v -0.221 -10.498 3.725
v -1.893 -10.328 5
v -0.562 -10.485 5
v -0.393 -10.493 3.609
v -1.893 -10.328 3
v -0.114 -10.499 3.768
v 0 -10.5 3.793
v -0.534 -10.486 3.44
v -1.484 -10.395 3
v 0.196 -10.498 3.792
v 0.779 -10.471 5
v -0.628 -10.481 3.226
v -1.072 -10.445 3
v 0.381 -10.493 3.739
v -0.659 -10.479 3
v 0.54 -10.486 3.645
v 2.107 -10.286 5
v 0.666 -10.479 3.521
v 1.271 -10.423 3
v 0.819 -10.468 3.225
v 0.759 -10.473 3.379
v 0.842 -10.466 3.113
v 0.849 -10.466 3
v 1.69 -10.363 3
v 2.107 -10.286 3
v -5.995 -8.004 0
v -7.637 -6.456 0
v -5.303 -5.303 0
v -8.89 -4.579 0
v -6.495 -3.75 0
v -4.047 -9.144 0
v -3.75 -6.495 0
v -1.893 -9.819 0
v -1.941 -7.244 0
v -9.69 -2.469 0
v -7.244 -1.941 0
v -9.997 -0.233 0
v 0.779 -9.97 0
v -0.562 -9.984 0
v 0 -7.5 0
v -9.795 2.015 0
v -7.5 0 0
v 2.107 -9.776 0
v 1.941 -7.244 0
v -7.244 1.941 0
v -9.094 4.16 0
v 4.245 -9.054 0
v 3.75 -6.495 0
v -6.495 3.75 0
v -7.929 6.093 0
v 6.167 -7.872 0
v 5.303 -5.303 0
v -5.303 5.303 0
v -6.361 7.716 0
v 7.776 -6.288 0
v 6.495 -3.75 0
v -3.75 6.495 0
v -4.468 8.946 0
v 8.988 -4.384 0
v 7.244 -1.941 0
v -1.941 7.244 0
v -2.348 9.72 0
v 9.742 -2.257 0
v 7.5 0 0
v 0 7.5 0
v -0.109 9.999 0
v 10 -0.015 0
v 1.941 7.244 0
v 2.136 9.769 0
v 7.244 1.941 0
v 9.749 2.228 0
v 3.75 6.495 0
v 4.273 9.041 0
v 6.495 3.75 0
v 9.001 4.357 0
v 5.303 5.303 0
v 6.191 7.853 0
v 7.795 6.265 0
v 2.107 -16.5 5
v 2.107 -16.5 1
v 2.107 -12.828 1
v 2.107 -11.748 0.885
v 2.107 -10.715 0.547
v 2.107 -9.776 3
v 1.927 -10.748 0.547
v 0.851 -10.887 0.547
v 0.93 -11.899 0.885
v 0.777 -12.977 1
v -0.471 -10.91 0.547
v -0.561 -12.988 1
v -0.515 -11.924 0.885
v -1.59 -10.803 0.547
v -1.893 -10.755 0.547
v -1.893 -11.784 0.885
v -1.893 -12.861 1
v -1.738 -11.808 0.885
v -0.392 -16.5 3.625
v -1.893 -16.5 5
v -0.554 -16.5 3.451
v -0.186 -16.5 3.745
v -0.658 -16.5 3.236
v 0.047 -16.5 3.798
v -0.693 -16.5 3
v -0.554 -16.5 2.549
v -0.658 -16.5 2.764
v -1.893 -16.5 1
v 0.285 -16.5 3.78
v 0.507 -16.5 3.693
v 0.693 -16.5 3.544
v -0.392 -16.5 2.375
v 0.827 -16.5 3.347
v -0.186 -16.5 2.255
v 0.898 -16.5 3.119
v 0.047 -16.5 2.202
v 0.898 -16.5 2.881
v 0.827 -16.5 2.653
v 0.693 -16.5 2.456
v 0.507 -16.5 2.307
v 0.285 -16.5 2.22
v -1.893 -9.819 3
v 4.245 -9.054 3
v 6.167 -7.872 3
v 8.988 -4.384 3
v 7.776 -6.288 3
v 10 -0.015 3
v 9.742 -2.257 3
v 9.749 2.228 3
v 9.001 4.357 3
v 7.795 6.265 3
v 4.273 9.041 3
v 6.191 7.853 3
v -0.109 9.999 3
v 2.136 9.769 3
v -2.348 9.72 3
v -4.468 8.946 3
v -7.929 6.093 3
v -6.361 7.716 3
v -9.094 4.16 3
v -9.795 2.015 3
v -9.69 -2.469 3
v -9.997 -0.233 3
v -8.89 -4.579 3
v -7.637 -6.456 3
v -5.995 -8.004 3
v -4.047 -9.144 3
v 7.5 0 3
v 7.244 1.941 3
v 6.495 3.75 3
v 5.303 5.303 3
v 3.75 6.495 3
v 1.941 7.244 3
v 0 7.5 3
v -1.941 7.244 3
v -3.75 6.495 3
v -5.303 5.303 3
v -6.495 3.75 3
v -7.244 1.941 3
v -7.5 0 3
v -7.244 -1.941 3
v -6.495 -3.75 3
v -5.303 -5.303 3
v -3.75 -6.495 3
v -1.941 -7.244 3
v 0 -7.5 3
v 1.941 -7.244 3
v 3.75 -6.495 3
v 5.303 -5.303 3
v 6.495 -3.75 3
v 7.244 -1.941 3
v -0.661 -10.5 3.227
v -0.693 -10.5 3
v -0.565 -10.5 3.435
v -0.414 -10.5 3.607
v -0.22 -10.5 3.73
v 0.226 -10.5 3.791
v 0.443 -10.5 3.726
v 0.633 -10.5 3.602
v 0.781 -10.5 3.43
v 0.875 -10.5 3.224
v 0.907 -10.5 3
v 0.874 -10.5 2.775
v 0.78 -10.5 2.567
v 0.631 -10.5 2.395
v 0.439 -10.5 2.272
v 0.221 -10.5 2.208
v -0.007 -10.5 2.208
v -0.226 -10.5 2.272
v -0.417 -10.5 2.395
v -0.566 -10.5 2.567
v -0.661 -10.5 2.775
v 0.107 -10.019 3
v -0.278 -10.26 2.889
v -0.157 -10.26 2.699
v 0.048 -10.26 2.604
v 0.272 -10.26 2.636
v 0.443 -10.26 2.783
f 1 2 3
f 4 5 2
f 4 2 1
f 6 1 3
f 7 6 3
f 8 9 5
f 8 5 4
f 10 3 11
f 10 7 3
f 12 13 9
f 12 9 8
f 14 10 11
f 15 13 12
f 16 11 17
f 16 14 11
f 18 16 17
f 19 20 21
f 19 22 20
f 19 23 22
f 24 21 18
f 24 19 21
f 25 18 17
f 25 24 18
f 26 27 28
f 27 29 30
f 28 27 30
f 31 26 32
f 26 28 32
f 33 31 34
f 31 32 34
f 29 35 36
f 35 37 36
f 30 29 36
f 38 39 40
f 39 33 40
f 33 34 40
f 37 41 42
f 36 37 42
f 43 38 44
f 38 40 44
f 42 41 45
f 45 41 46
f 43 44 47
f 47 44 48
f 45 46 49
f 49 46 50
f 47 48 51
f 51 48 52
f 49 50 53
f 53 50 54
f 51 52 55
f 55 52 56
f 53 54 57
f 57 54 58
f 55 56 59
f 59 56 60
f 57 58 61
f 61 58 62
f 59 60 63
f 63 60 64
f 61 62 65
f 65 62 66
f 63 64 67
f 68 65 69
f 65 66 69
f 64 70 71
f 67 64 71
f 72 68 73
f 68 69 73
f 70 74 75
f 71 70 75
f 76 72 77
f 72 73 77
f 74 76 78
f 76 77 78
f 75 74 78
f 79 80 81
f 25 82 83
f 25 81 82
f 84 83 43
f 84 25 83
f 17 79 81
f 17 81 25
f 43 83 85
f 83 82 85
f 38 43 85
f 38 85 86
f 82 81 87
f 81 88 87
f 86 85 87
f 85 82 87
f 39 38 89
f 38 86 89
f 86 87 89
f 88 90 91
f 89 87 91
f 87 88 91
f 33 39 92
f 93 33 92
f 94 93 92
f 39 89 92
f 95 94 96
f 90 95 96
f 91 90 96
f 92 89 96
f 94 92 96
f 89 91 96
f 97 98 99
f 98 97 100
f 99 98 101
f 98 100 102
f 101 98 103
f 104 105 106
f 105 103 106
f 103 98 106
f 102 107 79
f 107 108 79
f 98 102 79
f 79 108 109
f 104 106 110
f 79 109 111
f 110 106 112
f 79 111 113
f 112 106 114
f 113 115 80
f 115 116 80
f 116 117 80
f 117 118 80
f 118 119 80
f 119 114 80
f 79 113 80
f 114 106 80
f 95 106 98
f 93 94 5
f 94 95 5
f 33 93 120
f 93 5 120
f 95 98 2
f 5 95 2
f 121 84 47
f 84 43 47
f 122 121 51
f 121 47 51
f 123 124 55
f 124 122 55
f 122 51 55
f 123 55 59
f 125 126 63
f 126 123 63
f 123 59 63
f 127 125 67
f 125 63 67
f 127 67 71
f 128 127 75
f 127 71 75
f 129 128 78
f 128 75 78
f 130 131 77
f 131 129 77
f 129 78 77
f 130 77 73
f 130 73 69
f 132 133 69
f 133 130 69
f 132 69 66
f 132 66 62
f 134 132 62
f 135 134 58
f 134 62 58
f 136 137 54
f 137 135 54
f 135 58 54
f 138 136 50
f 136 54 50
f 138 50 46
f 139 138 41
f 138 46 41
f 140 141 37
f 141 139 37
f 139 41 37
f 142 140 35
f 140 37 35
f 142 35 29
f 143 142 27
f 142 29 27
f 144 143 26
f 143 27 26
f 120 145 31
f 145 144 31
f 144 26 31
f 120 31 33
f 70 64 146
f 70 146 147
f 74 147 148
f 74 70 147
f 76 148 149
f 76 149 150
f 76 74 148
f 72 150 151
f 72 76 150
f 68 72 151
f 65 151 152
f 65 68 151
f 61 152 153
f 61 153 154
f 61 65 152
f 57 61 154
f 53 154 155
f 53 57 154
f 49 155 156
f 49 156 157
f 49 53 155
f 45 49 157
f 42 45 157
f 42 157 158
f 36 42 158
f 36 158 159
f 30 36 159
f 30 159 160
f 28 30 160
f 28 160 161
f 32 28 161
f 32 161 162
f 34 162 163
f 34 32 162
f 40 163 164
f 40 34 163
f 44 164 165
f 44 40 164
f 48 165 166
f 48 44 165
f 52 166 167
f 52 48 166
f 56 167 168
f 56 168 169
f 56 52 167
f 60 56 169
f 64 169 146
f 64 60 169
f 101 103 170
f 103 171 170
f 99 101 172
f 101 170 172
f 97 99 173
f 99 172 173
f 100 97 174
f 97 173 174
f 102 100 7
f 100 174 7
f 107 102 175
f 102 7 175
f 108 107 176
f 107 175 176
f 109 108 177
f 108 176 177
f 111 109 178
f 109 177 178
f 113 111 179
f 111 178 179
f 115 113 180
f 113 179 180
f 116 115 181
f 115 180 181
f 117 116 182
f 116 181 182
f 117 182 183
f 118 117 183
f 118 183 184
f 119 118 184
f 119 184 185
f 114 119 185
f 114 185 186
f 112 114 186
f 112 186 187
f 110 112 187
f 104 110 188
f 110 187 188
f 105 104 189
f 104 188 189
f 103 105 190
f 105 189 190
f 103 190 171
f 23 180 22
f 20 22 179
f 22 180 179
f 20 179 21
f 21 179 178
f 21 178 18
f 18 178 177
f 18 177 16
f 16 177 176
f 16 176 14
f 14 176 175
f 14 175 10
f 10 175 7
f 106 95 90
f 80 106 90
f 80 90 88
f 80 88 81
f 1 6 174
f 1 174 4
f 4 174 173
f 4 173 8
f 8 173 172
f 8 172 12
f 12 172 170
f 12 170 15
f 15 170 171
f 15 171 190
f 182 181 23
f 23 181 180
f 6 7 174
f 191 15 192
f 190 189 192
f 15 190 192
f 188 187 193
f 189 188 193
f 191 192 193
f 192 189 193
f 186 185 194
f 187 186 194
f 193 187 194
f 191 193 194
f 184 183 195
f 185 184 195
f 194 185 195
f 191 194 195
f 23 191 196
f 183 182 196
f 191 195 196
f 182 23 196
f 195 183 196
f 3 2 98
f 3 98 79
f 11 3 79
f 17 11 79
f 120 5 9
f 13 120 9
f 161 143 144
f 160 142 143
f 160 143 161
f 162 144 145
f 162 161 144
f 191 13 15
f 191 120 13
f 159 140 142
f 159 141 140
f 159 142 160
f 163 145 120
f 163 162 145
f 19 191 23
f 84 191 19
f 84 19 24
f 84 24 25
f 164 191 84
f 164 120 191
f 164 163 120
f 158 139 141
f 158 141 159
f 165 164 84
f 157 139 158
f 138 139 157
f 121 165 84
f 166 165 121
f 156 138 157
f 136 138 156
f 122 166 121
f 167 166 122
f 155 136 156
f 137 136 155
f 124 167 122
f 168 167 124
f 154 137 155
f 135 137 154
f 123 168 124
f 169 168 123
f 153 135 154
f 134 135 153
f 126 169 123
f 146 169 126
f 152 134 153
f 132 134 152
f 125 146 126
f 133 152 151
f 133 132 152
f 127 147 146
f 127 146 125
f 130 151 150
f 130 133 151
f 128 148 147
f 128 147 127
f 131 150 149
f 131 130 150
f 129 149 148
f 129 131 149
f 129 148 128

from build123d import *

# Parameters (mm, degrees)
F0_R        = 10
F0_R_2      = 7.5
F1_DEPTH    = 3
F3_W        = 4
F3_H        = 7
F4_DEPTH    = 4
F5_R        = 10.5
F6_DEPTH    = 25
F7_T4_ANGLE = 109.021242163
F9_D        = 1.6
F9_DEPTH    = 6
F9_TIP      = 0.4806884952


# Not quite as in the source:
# - a fillet or chamfer that OpenCascade refuses, or shapes differently, is made with other operations: its cross-section is extruded or revolved along the edge and cut away or added


with BuildPart() as f1:
    # F0 (on Top) → F1 (new body)
    with BuildSketch(Plane.XY):
        Circle(F0_R)
        Circle(F0_R_2, mode=Mode.SUBTRACT)
    extrude(amount=F1_DEPTH)

    # F3 (on offset) → F4 (join)
    with BuildSketch(Plane.XY.offset(1)):
        with Locations((0.106652909, -13)):
            Rectangle(F3_W, F3_H)
    extrude(amount=F4_DEPTH)

    # F5 (on face) → F6 (cut)
    with BuildSketch(Plane.XY.offset(3)):
        Circle(F5_R)
    extrude(amount=F6_DEPTH, mode=Mode.SUBTRACT)

    # F7: fillet of radius 5 on 1 edges, made by hand


with BuildPart() as f7_tool2:
    # F7_s3 → F7_t4 (revolve)
    with BuildSketch(Plane(origin=(0, 0, 0), x_dir=(0, 0, 1), z_dir=(0.5716546179, 0.8204943618, 0))):
        with BuildLine():
            ThreePointArc((0, 10), (0.7434164903, 11.4188611699), (1, 13))
            Line((1, 13), (1, 10))
            Line((1, 10), (0, 10))
        make_face()
    revolve(axis=Axis((0, 0, 1), (0, 0, -1)), revolution_arc=F7_T4_ANGLE)

    split(bisect_by=Plane.YZ.offset(2.106652909), keep=Keep.BOTTOM)

    split(bisect_by=Plane.YZ.offset(-1.893347091), keep=Keep.TOP)


with BuildPart() as f1_1:
    add(f1.part)

    # F7_t1: union F7_tool2
    add(f7_tool2.part)

    # F9
    with Locations(Plane.XZ.offset(16.5)):
        with Locations((0.106652909, 3)):
            Hole(F9_D / 2, depth=F9_DEPTH)
            with Locations((0, 0, -(F9_DEPTH + F9_TIP / 2))):  # 118° drill point
                Cone(0, F9_D / 2, F9_TIP, mode=Mode.SUBTRACT)


solid = f1_1.part
